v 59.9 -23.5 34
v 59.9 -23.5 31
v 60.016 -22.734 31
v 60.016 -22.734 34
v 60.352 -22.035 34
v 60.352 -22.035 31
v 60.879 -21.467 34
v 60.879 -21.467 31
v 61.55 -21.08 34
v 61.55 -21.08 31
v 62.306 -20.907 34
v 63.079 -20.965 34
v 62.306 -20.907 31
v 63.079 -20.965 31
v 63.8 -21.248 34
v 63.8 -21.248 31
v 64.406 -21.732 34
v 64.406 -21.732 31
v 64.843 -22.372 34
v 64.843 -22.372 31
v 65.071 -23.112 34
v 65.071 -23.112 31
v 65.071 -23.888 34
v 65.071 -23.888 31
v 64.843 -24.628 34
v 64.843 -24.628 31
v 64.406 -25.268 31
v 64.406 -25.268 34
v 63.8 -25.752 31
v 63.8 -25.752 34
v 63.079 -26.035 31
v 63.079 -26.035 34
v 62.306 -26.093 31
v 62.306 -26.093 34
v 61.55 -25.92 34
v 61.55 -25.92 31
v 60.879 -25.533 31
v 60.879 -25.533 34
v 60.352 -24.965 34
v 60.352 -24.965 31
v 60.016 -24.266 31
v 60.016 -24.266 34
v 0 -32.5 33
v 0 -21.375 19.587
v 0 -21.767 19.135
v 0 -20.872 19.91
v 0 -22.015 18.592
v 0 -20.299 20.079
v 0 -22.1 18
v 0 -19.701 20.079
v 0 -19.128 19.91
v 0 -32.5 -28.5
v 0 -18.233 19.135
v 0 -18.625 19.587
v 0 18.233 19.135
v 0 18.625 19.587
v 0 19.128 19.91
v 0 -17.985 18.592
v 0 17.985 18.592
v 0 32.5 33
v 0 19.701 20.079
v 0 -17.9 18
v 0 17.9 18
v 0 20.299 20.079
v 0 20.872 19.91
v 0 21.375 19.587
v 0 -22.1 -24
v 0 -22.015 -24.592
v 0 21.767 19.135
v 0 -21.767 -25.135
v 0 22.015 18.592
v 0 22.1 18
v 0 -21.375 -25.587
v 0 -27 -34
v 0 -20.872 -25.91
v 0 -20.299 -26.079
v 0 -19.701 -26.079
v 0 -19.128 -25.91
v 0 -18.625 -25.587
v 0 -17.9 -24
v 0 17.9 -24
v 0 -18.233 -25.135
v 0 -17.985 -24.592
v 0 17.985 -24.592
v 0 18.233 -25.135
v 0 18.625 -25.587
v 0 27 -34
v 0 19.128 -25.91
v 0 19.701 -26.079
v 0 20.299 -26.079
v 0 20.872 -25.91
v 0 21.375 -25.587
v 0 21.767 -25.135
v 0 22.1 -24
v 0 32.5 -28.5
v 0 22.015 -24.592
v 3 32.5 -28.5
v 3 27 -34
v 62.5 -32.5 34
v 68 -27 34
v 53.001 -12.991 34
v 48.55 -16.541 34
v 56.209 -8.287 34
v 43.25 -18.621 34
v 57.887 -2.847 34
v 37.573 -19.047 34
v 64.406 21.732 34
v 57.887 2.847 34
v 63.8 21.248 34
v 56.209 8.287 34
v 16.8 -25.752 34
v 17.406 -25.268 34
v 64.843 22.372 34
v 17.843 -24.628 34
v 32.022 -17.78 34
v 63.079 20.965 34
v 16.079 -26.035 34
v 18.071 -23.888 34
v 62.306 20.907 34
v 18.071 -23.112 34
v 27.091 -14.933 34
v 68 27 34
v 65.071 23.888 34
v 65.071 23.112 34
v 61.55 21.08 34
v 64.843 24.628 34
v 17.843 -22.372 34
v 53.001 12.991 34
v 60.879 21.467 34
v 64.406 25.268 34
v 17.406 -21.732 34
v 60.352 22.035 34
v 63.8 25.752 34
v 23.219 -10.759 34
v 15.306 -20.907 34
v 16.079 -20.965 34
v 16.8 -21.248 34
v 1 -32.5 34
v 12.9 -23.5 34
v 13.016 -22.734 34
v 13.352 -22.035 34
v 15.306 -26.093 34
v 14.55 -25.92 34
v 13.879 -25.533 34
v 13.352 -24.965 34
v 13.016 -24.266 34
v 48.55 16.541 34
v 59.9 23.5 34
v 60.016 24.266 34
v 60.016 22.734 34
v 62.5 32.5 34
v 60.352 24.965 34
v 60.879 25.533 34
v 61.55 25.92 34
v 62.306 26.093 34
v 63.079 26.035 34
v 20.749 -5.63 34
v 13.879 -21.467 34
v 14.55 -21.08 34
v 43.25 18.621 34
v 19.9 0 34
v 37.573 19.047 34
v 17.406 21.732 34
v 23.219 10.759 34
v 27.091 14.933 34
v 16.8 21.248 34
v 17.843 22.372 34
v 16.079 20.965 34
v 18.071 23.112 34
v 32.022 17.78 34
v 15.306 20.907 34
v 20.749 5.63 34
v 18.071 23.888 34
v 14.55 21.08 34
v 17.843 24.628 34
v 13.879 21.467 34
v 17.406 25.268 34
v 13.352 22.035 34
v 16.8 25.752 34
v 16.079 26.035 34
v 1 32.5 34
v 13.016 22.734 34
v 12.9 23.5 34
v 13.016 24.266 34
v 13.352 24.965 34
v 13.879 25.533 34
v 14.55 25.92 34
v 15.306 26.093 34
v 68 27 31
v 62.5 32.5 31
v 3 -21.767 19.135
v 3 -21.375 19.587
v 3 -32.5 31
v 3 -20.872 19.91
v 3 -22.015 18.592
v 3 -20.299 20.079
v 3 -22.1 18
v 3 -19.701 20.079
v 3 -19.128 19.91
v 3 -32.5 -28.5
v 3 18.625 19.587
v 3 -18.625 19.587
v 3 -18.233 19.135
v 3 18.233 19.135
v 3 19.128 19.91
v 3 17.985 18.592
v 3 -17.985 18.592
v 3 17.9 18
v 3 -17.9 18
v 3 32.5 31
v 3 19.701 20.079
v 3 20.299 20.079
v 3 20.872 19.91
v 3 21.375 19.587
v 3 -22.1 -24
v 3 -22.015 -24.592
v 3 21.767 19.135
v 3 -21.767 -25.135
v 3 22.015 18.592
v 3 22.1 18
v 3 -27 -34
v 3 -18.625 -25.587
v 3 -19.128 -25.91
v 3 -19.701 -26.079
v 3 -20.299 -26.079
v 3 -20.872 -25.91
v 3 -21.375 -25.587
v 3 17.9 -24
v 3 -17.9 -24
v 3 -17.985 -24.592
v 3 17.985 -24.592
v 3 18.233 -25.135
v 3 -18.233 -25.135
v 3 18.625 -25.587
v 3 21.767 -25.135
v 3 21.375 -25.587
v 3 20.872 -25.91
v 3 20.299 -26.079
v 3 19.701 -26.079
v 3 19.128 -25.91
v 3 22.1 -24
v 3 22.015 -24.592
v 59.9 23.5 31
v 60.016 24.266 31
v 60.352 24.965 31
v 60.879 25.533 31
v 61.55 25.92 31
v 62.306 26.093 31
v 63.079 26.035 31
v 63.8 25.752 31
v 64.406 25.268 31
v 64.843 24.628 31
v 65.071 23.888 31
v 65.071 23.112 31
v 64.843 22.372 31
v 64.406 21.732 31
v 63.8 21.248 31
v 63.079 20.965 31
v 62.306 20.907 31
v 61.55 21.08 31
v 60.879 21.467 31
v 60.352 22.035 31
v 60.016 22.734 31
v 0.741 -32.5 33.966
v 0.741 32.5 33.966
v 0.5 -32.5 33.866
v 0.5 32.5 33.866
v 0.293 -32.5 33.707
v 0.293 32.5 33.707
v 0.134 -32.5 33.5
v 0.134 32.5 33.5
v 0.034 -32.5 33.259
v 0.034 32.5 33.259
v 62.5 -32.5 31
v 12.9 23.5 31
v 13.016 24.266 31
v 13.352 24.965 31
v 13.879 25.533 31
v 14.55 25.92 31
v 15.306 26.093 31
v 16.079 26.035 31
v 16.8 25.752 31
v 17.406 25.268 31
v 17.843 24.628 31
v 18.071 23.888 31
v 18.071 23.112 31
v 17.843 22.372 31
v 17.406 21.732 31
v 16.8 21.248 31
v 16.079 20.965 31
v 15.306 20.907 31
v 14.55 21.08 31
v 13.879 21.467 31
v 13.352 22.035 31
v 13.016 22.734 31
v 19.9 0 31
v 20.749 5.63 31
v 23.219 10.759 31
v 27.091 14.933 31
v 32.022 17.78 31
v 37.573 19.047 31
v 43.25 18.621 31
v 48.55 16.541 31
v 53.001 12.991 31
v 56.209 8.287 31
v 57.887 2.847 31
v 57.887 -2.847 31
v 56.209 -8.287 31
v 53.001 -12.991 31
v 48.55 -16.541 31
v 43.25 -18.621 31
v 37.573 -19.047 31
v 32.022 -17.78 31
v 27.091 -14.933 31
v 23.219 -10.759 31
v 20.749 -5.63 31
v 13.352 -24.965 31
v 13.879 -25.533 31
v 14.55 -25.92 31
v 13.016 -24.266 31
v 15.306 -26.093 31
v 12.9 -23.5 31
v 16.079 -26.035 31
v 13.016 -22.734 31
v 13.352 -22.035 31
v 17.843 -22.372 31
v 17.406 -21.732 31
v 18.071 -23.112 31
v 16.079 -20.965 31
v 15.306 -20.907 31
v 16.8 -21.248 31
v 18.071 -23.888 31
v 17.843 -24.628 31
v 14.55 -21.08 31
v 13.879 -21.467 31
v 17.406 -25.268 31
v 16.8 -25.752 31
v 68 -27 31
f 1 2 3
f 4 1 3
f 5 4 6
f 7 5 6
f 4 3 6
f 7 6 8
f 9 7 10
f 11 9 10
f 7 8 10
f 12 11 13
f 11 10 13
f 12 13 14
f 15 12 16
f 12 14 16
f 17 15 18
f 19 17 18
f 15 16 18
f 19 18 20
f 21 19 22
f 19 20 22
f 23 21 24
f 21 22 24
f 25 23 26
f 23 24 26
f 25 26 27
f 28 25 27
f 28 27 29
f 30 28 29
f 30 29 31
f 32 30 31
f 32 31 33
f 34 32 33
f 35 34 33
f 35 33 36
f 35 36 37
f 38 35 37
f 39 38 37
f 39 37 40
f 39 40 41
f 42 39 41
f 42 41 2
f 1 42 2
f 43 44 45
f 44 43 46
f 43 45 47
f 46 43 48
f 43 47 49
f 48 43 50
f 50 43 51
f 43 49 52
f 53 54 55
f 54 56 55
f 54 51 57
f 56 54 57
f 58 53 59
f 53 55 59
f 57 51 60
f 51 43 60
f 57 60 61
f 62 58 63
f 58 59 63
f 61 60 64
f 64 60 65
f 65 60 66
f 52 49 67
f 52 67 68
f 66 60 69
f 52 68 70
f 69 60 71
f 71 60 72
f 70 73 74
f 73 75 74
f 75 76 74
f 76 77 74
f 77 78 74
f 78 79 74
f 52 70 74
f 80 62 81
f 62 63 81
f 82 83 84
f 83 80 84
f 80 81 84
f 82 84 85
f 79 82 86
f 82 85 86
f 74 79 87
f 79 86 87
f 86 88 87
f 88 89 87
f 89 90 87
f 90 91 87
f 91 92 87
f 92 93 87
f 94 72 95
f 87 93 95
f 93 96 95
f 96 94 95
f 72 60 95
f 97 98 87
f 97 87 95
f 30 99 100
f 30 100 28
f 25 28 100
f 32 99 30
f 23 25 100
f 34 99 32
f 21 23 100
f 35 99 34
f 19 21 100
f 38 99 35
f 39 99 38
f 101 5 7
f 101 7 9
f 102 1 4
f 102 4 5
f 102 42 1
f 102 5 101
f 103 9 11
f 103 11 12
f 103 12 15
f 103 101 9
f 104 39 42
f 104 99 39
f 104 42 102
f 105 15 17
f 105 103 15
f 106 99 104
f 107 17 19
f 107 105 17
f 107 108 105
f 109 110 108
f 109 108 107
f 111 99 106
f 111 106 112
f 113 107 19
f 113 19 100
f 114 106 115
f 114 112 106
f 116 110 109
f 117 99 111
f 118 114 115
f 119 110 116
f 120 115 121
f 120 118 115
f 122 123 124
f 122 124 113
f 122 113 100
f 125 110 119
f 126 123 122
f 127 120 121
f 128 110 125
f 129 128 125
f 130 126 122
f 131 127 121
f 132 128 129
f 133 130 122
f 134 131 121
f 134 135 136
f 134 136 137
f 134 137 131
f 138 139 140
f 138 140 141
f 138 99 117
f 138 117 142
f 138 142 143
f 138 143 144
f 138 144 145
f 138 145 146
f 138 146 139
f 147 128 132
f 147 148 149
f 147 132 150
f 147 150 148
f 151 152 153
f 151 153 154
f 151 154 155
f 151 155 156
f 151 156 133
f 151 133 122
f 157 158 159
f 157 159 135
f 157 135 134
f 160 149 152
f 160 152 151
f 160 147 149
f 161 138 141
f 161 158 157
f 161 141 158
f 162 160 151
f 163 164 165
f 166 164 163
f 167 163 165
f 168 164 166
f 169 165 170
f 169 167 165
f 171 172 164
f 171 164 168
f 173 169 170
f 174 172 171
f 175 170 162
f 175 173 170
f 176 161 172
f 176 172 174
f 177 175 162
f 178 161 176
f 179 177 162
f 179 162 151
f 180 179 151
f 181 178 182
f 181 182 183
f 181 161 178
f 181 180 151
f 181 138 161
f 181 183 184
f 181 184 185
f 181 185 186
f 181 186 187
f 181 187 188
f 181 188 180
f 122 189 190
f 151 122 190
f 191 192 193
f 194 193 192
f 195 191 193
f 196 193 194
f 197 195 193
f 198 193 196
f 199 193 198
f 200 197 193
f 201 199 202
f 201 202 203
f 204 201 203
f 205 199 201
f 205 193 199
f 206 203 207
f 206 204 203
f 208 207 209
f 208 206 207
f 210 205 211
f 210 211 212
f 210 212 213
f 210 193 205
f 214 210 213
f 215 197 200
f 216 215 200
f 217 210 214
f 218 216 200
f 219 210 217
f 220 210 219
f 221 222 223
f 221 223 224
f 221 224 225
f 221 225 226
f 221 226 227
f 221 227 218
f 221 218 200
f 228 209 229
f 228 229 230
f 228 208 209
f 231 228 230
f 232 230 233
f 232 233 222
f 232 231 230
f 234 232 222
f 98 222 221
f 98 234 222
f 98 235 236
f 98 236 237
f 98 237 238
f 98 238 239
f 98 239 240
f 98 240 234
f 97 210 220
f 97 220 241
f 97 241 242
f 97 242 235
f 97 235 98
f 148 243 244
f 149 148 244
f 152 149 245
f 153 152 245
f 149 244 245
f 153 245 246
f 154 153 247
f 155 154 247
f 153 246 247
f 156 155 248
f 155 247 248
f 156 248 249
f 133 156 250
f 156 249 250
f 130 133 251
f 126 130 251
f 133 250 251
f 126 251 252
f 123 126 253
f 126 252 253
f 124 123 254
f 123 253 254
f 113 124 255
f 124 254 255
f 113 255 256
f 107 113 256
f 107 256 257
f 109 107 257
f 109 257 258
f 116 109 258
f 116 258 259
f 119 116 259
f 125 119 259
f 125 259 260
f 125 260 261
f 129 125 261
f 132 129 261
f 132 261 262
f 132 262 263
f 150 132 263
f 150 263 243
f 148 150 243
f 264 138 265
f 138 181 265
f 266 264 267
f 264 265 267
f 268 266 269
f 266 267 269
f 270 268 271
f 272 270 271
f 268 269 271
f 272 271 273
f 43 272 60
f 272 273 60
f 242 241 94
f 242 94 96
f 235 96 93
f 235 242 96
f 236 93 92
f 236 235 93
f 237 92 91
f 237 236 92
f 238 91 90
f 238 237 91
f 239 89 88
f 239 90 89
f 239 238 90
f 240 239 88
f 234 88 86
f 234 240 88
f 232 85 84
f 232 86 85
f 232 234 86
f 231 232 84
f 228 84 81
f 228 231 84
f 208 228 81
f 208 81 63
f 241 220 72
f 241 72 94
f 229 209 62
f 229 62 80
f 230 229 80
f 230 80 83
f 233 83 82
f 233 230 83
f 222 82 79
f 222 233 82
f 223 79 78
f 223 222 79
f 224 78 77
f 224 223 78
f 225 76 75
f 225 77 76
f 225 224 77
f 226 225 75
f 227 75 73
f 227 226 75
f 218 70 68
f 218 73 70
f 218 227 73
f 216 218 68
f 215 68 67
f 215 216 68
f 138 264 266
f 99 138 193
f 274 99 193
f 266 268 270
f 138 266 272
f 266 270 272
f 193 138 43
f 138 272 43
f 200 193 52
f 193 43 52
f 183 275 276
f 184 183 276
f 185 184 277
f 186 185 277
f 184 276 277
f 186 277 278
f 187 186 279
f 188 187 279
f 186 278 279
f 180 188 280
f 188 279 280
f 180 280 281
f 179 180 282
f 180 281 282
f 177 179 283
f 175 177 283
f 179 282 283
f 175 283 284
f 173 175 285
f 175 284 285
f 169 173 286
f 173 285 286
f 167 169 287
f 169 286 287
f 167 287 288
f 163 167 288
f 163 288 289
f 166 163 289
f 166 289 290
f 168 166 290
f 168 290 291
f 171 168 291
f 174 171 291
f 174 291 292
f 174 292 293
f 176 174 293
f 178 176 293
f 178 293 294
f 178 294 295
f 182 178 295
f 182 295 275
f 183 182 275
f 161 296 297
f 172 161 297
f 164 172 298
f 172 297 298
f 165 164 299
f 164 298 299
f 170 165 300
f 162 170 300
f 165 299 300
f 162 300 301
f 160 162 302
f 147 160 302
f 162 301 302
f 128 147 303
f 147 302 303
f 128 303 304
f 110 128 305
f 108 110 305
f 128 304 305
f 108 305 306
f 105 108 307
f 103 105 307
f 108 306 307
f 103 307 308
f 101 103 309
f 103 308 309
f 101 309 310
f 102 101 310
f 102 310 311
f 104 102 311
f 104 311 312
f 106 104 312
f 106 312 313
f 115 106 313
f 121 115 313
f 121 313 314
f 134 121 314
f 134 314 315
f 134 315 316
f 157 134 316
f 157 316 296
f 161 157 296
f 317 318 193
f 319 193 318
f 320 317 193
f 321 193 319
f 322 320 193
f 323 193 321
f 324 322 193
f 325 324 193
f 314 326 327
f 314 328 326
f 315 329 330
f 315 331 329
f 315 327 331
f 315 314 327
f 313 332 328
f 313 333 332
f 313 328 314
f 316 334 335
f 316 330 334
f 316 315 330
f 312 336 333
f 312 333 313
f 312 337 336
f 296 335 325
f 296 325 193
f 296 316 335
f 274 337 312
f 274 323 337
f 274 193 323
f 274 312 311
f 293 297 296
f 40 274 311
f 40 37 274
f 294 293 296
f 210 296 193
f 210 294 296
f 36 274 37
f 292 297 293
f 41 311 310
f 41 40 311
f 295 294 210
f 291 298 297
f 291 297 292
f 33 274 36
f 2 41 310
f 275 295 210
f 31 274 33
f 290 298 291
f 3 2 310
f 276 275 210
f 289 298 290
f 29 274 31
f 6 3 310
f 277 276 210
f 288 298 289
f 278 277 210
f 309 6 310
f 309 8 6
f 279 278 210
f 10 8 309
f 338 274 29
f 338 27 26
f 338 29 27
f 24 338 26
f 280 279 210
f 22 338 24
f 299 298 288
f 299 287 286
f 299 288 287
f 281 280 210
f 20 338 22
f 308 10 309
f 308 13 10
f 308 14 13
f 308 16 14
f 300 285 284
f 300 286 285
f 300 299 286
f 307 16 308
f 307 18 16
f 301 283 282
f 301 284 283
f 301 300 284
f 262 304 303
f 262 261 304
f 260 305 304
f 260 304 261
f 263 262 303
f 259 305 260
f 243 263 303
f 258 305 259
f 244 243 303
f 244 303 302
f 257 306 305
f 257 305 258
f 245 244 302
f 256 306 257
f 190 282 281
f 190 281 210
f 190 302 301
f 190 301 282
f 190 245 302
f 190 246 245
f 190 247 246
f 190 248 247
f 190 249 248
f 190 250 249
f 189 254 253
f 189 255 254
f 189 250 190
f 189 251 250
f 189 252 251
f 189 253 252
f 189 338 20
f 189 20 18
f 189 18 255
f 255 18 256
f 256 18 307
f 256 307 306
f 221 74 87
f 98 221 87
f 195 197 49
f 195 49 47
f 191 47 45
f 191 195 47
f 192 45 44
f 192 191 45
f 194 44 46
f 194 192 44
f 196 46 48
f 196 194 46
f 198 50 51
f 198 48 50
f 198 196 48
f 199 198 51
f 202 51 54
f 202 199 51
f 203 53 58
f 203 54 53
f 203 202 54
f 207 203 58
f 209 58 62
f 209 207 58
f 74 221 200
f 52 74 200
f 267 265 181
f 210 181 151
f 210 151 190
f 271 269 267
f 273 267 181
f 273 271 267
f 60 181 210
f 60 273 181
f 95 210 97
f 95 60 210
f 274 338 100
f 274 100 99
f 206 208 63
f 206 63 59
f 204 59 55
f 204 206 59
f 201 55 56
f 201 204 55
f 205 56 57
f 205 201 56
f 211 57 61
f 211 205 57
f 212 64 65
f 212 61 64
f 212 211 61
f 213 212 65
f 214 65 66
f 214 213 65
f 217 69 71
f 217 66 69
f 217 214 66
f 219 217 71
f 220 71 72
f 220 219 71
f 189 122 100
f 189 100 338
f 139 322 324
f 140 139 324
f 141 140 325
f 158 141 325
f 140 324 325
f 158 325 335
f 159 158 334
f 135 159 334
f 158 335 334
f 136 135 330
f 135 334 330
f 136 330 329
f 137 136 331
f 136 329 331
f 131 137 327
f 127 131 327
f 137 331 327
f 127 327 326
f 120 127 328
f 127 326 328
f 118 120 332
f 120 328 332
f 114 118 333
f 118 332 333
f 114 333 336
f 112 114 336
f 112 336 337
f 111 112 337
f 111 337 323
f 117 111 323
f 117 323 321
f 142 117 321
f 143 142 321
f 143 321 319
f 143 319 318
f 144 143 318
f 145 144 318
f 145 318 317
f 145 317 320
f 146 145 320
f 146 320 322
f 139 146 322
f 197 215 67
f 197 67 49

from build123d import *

# Parameters (mm, degrees)
SKETCH_1_W          = 68
SKETCH_1_H          = 65
EXTRUDE_1_DEPTH     = 68
SKETCH_2_W          = 65
SKETCH_2_H          = 65
CUT_EXTRUDE_1_DEPTH = 65
FILLET_1_R          = 1
SKETCH_6_R          = 2.6
SKETCH_6_R_2        = 19.1
CUT_EXTRUDE_4_DEPTH = 51
CUT_EXTRUDE_5_DEPTH = 51


with BuildPart() as part:
    # 草图1 → 凸台-拉伸1 (new body)
    with BuildSketch(Plane(origin=(0, 0, 0), x_dir=(0, 0, -1), z_dir=(1, 0, 0))):
        Rectangle(SKETCH_1_W, SKETCH_1_H)
    extrude(amount=EXTRUDE_1_DEPTH)

    # 草图2 → 切除-拉伸1 (cut)
    with BuildSketch(Plane(origin=(68, 0, 0), x_dir=(0, 0, -1), z_dir=(1, 0, 0))):
        with Locations((1.5, 0)):
            Rectangle(SKETCH_2_W, SKETCH_2_H)
    extrude(amount=-CUT_EXTRUDE_1_DEPTH, mode=Mode.SUBTRACT)

    # 圆角1
    fillet_1_edges = [part.edges().sort_by_distance(p)[0] for p in [
        (0, 0, 34),
    ]]
    fillet(fillet_1_edges, radius=FILLET_1_R)

    # 草图6 → 切除-拉伸4 (cut)
    with BuildSketch(Plane(origin=(0, 0, 31), x_dir=(-1, 0, 0), z_dir=(0, 0, -1))):
        with Locations((-62.5, 23.5)):
            Circle(SKETCH_6_R)
        with Locations((-15.5, 23.5)):
            Circle(SKETCH_6_R)
        with Locations((-39, 0)):
            Circle(SKETCH_6_R_2)
        with Locations((-15.5, -23.5)):
            Circle(SKETCH_6_R)
        with Locations((-62.5, -23.5)):
            Circle(SKETCH_6_R)
        Polygon((-68, 32.5), (-68, 27), (-62.5, 32.5), align=None)
        Polygon((-68, -27), (-62.5, -32.5), (-68, -32.5), align=None)
    extrude(amount=-CUT_EXTRUDE_4_DEPTH, mode=Mode.SUBTRACT)

    # 草图7 → 切除-拉伸5 (cut)
    with BuildSketch(Plane(origin=(3, 0, 0), x_dir=(0, 0, -1), z_dir=(1, 0, 0))):
        Polygon((28.5, 32.5), (34, 32.5), (34, 27), align=None)
        with BuildLine():
            Line((-18, 22.1), (24, 22.1))
            ThreePointArc((24, 22.1), (26.1, 20), (24, 17.9))
            Line((24, 17.9), (-18, 17.9))
            ThreePointArc((-18, 17.9), (-20.1, 20), (-18, 22.1))
        make_face()
        Polygon((34, -32.5), (34, -27), (28.5, -32.5), align=None)
        with BuildLine():
            Line((-18, -17.9), (24, -17.9))
            ThreePointArc((24, -17.9), (26.1, -20), (24, -22.1))
            Line((24, -22.1), (-18, -22.1))
            ThreePointArc((-18, -22.1), (-20.1, -20), (-18, -17.9))
        make_face()
    extrude(amount=-CUT_EXTRUDE_5_DEPTH, mode=Mode.SUBTRACT)


solid = part.part
